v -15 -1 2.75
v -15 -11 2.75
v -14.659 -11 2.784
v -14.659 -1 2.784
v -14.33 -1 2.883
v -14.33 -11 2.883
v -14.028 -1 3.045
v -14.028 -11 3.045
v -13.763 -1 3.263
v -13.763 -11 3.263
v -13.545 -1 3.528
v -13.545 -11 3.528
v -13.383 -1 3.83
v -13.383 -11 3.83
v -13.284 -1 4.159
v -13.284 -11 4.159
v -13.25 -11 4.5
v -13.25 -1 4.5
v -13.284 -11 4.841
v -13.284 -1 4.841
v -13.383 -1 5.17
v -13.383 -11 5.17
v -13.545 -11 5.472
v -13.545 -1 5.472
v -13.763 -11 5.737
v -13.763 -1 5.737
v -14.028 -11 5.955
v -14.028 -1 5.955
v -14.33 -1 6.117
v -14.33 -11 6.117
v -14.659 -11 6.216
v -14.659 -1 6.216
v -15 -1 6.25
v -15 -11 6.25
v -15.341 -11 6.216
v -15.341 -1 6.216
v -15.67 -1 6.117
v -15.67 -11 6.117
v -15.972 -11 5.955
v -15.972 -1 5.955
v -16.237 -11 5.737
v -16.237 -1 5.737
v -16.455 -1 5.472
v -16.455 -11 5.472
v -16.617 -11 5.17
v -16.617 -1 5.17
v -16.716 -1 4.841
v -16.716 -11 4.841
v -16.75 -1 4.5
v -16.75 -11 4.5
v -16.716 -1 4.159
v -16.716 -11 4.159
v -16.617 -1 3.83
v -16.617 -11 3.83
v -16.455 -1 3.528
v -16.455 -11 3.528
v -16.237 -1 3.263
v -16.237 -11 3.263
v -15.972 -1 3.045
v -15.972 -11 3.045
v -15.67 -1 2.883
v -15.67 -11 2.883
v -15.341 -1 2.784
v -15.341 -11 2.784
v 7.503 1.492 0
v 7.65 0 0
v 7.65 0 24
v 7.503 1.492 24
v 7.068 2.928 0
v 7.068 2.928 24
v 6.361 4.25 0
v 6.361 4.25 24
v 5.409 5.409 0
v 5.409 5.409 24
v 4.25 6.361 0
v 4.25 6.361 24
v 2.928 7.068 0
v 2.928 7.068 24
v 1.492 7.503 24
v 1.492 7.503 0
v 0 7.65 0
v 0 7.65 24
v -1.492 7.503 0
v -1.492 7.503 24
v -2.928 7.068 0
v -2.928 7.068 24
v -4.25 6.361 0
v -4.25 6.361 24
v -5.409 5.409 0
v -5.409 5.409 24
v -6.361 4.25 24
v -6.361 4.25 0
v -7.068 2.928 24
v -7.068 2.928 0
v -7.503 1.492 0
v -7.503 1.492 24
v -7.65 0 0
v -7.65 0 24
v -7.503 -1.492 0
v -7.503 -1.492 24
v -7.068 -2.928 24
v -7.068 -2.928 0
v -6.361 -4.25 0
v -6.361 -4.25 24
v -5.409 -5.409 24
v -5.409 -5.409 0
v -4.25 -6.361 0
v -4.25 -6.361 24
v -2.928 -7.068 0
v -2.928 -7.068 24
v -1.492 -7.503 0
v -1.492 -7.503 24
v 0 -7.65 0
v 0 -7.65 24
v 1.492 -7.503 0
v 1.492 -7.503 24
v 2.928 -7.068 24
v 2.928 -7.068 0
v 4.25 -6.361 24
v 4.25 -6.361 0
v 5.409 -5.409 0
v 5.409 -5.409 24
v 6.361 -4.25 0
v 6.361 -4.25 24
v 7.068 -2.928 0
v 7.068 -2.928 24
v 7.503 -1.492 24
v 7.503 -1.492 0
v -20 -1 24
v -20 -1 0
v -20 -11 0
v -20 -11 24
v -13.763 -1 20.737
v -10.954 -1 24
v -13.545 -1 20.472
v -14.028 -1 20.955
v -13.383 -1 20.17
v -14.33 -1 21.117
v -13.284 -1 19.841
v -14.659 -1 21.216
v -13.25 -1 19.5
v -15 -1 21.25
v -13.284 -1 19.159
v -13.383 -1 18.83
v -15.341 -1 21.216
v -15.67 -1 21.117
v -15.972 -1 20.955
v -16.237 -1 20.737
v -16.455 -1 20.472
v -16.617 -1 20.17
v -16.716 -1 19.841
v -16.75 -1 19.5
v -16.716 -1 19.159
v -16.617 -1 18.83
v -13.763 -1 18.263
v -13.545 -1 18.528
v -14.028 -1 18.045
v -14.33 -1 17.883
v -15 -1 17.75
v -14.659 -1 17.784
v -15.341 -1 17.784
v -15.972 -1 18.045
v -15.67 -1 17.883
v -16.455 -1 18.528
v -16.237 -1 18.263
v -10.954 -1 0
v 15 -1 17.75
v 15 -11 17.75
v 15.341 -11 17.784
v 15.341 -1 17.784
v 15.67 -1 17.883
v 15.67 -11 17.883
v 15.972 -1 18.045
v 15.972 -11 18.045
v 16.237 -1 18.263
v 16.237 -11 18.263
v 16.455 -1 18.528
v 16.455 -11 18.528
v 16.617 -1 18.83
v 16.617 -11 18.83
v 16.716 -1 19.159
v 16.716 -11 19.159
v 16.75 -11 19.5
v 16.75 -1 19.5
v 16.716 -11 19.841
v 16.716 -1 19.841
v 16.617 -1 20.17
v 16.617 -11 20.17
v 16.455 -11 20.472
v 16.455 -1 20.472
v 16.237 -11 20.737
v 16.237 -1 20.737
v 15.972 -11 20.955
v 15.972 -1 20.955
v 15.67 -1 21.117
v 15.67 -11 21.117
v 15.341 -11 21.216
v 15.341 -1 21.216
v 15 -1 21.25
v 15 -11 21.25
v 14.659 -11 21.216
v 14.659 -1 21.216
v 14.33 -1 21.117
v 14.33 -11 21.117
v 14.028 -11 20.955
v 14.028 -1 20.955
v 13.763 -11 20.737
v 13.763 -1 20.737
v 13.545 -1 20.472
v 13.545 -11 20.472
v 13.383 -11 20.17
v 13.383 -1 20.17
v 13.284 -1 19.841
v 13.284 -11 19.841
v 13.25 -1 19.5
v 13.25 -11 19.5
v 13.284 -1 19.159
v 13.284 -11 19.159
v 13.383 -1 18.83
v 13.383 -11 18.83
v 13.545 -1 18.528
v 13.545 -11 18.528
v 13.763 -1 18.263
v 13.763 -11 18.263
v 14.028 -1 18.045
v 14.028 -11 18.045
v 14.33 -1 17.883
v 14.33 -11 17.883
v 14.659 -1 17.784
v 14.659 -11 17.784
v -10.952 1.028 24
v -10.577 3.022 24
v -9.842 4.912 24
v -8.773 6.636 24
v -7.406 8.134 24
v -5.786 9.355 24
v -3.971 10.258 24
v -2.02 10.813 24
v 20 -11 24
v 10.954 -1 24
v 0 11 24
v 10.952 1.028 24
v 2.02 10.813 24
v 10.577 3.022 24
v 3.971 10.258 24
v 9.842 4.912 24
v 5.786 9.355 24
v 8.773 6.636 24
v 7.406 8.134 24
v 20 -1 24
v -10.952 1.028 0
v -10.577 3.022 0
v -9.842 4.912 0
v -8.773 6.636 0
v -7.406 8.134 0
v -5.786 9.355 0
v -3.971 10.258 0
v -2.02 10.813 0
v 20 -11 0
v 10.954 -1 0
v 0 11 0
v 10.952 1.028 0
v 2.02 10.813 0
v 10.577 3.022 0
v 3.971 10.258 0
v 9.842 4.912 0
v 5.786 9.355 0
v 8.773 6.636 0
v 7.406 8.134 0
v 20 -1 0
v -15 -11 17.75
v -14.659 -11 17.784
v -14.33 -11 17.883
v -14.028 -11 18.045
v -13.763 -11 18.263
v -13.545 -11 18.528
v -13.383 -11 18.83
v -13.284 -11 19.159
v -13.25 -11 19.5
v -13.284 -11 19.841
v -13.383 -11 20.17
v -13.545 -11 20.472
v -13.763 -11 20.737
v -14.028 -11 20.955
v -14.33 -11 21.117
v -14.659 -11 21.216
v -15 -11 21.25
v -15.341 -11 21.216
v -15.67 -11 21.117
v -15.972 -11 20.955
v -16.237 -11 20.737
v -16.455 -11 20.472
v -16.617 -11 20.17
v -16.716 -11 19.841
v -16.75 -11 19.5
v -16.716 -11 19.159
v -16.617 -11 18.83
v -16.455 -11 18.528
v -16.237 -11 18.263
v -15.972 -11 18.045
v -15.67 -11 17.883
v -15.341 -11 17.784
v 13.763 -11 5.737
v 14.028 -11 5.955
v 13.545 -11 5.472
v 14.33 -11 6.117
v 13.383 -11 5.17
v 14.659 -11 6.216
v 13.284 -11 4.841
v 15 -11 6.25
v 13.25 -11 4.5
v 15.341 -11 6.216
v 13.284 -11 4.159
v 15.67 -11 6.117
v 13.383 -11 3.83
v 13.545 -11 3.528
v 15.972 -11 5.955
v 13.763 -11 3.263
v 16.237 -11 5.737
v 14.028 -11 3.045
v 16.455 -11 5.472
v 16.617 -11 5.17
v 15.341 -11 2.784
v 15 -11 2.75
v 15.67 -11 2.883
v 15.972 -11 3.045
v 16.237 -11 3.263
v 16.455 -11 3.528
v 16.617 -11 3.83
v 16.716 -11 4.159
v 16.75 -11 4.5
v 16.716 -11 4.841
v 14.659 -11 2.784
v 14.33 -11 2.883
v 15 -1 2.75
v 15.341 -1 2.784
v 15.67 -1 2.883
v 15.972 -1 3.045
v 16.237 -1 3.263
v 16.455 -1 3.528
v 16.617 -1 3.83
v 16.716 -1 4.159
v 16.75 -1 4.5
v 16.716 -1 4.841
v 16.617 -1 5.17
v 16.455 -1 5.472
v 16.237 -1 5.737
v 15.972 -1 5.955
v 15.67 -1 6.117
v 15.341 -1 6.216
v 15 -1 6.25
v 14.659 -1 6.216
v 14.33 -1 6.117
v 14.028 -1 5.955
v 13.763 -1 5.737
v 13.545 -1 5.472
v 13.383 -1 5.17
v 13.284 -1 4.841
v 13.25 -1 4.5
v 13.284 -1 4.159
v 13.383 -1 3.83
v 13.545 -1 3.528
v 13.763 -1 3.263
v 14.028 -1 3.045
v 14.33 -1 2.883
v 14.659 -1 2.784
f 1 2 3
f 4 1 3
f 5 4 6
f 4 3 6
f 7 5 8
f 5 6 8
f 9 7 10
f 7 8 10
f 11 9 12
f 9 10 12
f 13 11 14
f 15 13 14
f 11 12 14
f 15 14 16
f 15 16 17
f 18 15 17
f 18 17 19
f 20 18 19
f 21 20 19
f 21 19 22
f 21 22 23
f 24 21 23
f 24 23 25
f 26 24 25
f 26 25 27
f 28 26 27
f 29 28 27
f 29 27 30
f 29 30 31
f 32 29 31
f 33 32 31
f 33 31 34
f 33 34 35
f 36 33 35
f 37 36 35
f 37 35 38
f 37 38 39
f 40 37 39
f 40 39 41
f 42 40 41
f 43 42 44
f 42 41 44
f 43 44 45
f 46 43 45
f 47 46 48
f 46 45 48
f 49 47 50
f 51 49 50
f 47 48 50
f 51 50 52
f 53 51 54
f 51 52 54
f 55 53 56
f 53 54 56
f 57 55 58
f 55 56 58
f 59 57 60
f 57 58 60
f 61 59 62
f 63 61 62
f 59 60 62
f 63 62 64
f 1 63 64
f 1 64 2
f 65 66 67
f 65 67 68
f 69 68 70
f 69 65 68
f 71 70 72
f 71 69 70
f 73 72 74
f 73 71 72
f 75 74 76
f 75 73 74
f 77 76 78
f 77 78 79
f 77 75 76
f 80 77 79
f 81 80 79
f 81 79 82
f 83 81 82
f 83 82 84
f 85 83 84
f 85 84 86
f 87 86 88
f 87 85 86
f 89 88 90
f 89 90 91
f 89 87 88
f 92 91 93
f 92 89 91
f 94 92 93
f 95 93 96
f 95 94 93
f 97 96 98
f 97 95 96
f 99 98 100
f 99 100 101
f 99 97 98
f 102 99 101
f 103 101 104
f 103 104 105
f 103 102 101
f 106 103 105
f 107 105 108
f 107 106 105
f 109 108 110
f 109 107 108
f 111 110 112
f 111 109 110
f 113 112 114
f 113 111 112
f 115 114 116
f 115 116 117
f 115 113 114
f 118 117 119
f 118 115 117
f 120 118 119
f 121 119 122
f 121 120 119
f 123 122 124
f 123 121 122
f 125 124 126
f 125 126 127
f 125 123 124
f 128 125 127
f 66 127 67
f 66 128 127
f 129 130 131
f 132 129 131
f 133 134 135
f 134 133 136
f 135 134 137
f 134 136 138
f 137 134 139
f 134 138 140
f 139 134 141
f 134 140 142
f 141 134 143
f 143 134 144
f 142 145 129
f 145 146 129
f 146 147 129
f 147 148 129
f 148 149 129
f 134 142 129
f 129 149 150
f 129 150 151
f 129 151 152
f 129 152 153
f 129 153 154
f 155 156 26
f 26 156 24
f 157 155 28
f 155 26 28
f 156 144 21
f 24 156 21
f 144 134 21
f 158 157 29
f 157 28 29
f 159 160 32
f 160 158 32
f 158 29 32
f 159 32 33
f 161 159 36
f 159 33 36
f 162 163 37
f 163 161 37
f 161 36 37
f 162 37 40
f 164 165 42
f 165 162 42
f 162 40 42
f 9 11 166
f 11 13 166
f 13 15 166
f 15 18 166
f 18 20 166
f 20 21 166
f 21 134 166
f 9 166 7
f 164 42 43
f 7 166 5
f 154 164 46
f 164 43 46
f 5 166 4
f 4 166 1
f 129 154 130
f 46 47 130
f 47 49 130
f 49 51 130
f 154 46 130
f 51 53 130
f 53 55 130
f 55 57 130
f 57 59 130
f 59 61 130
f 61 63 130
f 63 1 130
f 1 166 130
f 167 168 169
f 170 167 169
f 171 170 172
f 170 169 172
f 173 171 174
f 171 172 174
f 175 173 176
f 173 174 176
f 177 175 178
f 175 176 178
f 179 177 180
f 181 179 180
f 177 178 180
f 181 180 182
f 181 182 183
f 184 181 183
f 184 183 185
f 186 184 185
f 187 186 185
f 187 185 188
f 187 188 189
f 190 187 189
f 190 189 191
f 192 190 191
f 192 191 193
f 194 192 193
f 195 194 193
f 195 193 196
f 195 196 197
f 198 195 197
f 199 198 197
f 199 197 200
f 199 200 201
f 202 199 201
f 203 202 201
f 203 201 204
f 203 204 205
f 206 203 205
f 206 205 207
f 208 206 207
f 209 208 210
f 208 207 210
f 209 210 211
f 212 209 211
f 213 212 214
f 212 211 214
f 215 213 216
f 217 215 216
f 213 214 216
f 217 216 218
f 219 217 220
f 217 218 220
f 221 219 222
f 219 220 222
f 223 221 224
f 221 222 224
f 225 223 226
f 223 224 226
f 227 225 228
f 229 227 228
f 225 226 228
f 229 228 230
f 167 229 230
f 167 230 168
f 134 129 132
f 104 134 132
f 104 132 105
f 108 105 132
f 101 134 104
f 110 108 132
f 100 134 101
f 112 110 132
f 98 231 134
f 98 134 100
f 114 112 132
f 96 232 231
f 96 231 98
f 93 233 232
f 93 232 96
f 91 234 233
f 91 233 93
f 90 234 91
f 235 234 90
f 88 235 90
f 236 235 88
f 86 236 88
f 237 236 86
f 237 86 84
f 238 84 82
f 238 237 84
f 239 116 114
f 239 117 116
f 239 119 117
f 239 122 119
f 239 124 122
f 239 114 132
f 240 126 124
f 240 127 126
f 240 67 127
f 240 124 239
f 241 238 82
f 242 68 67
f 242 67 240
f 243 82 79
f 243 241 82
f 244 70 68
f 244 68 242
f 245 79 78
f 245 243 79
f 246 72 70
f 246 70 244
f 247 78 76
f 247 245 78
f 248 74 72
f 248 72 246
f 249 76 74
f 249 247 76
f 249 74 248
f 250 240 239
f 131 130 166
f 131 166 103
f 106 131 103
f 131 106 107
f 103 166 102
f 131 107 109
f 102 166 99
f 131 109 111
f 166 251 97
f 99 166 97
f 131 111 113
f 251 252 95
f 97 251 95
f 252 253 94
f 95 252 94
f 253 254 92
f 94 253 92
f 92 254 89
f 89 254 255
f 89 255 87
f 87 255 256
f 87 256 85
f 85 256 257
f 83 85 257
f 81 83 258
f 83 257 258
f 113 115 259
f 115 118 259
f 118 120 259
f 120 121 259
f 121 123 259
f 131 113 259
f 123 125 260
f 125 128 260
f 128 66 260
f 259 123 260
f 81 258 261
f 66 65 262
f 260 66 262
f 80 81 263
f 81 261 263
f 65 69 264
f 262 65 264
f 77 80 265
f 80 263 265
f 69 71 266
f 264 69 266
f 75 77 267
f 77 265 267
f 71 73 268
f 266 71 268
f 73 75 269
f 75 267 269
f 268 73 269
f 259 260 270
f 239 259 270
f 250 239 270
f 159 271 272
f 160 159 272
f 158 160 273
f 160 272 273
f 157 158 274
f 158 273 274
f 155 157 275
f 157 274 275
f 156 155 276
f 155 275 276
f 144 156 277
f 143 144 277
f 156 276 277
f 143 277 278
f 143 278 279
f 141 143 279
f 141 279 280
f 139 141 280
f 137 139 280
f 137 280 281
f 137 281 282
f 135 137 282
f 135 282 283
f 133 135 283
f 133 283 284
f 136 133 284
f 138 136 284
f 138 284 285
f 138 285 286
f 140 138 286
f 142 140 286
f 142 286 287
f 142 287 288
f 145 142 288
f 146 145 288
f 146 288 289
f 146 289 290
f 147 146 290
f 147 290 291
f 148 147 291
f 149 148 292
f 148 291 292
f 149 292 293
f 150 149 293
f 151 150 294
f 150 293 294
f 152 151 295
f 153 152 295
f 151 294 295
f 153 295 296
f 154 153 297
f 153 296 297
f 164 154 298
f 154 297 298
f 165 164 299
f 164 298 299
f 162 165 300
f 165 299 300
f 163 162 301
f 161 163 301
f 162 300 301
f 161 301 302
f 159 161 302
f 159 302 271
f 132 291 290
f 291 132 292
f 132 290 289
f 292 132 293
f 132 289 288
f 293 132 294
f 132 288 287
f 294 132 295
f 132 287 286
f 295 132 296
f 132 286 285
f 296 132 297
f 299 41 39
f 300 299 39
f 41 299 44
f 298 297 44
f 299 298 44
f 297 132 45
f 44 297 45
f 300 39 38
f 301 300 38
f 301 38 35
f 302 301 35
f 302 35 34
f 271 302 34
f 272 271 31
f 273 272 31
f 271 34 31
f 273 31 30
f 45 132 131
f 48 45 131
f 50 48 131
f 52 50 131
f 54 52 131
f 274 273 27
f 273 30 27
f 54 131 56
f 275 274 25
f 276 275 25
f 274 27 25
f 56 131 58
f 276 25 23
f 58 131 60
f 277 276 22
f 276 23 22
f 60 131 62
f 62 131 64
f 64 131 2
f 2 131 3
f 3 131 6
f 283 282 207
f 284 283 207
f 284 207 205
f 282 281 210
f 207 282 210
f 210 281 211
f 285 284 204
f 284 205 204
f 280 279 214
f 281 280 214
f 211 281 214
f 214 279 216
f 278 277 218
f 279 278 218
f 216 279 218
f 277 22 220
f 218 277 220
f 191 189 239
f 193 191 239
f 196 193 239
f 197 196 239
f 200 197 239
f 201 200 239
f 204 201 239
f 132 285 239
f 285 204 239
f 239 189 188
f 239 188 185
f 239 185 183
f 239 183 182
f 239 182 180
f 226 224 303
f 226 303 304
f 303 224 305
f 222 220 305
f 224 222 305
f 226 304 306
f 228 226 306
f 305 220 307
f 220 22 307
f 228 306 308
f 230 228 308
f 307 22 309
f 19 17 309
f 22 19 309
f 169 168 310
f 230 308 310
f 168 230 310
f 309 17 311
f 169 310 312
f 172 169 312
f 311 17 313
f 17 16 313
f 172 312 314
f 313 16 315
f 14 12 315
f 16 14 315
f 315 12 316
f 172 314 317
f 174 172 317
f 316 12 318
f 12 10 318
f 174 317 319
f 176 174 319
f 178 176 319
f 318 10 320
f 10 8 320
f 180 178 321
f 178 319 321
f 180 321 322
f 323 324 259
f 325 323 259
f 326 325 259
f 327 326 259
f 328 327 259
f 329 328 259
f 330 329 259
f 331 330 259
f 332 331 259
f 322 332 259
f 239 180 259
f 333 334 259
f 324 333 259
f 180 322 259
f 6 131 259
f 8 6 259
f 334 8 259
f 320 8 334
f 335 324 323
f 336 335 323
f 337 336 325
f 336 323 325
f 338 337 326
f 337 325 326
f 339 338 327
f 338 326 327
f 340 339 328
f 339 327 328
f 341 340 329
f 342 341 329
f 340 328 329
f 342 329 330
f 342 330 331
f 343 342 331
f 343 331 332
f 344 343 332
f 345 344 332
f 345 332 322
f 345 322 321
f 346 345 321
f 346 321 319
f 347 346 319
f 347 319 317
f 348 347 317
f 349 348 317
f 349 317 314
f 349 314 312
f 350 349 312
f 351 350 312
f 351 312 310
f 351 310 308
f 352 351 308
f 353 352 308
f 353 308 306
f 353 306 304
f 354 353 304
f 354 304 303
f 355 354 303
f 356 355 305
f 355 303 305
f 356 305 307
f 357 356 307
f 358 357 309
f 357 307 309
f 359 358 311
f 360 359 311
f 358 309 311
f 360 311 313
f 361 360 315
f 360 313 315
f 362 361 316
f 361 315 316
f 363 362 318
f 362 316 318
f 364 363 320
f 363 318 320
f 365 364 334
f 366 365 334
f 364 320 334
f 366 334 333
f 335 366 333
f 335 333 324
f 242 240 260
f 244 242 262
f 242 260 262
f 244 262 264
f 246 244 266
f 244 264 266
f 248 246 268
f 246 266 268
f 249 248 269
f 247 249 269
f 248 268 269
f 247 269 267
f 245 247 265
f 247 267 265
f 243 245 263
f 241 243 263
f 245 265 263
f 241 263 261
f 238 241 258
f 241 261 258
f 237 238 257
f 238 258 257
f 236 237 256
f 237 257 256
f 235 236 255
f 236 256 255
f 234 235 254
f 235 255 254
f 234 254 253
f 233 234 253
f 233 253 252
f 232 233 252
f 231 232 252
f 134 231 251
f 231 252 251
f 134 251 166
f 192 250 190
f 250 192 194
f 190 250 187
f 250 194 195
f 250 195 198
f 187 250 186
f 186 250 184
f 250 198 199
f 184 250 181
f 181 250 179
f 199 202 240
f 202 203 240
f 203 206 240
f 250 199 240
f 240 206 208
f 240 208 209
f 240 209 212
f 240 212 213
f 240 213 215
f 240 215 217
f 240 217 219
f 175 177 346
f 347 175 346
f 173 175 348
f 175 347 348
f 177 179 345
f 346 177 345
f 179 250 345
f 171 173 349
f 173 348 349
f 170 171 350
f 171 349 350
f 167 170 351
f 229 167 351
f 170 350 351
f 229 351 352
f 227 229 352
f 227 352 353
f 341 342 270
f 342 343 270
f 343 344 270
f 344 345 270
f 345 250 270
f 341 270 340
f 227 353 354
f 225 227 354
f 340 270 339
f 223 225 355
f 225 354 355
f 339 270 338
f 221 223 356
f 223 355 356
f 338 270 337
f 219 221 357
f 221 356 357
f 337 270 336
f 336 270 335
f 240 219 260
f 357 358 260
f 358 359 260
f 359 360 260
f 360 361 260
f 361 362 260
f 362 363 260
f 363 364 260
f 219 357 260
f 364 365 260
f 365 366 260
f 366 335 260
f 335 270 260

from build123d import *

# Parameters (mm, degrees)
ESBO_O1_R                = 7.65
RESSALTO_EXTRUS_O1_DEPTH = 24
ESBO_O2_R                = 1.75
CORTE_EXTRUS_O1_DEPTH    = 20


with BuildPart() as part:
    # Esboço1 → Ressalto-extrusão1 (new body)
    with BuildSketch(Plane.XY):
        with BuildLine():
            Line((-10.95445115, -1), (-20, -1))
            Line((-20, -1), (-20, -11))
            Line((-20, -11), (0, -11))
            Line((0, -11), (20, -11))
            Line((20, -11), (20, -1))
            Line((20, -1), (10.95445115, -1))
            ThreePointArc((10.95445115, -1), (0, 11), (-10.95445115, -1))
        make_face()
        Circle(ESBO_O1_R, mode=Mode.SUBTRACT)
    extrude(amount=RESSALTO_EXTRUS_O1_DEPTH)

    # Esboço2 → Corte-extrusão1 (cut)
    with BuildSketch(Plane.XZ.offset(11)):
        with Locations(Location((15, 19.5, 0), (0, 0, 270))):
            Circle(ESBO_O2_R)
        with Locations(Location((15, 4.5, 0), (0, 0, 270))):
            Circle(ESBO_O2_R)
        with Locations(Location((-15, 4.5, 0), (0, 0, 270))):
            Circle(ESBO_O2_R)
        with Locations(Location((-15, 19.5, 0), (0, 0, 270))):
            Circle(ESBO_O2_R)
    extrude(amount=-CORTE_EXTRUS_O1_DEPTH, mode=Mode.SUBTRACT)


solid = part.part
